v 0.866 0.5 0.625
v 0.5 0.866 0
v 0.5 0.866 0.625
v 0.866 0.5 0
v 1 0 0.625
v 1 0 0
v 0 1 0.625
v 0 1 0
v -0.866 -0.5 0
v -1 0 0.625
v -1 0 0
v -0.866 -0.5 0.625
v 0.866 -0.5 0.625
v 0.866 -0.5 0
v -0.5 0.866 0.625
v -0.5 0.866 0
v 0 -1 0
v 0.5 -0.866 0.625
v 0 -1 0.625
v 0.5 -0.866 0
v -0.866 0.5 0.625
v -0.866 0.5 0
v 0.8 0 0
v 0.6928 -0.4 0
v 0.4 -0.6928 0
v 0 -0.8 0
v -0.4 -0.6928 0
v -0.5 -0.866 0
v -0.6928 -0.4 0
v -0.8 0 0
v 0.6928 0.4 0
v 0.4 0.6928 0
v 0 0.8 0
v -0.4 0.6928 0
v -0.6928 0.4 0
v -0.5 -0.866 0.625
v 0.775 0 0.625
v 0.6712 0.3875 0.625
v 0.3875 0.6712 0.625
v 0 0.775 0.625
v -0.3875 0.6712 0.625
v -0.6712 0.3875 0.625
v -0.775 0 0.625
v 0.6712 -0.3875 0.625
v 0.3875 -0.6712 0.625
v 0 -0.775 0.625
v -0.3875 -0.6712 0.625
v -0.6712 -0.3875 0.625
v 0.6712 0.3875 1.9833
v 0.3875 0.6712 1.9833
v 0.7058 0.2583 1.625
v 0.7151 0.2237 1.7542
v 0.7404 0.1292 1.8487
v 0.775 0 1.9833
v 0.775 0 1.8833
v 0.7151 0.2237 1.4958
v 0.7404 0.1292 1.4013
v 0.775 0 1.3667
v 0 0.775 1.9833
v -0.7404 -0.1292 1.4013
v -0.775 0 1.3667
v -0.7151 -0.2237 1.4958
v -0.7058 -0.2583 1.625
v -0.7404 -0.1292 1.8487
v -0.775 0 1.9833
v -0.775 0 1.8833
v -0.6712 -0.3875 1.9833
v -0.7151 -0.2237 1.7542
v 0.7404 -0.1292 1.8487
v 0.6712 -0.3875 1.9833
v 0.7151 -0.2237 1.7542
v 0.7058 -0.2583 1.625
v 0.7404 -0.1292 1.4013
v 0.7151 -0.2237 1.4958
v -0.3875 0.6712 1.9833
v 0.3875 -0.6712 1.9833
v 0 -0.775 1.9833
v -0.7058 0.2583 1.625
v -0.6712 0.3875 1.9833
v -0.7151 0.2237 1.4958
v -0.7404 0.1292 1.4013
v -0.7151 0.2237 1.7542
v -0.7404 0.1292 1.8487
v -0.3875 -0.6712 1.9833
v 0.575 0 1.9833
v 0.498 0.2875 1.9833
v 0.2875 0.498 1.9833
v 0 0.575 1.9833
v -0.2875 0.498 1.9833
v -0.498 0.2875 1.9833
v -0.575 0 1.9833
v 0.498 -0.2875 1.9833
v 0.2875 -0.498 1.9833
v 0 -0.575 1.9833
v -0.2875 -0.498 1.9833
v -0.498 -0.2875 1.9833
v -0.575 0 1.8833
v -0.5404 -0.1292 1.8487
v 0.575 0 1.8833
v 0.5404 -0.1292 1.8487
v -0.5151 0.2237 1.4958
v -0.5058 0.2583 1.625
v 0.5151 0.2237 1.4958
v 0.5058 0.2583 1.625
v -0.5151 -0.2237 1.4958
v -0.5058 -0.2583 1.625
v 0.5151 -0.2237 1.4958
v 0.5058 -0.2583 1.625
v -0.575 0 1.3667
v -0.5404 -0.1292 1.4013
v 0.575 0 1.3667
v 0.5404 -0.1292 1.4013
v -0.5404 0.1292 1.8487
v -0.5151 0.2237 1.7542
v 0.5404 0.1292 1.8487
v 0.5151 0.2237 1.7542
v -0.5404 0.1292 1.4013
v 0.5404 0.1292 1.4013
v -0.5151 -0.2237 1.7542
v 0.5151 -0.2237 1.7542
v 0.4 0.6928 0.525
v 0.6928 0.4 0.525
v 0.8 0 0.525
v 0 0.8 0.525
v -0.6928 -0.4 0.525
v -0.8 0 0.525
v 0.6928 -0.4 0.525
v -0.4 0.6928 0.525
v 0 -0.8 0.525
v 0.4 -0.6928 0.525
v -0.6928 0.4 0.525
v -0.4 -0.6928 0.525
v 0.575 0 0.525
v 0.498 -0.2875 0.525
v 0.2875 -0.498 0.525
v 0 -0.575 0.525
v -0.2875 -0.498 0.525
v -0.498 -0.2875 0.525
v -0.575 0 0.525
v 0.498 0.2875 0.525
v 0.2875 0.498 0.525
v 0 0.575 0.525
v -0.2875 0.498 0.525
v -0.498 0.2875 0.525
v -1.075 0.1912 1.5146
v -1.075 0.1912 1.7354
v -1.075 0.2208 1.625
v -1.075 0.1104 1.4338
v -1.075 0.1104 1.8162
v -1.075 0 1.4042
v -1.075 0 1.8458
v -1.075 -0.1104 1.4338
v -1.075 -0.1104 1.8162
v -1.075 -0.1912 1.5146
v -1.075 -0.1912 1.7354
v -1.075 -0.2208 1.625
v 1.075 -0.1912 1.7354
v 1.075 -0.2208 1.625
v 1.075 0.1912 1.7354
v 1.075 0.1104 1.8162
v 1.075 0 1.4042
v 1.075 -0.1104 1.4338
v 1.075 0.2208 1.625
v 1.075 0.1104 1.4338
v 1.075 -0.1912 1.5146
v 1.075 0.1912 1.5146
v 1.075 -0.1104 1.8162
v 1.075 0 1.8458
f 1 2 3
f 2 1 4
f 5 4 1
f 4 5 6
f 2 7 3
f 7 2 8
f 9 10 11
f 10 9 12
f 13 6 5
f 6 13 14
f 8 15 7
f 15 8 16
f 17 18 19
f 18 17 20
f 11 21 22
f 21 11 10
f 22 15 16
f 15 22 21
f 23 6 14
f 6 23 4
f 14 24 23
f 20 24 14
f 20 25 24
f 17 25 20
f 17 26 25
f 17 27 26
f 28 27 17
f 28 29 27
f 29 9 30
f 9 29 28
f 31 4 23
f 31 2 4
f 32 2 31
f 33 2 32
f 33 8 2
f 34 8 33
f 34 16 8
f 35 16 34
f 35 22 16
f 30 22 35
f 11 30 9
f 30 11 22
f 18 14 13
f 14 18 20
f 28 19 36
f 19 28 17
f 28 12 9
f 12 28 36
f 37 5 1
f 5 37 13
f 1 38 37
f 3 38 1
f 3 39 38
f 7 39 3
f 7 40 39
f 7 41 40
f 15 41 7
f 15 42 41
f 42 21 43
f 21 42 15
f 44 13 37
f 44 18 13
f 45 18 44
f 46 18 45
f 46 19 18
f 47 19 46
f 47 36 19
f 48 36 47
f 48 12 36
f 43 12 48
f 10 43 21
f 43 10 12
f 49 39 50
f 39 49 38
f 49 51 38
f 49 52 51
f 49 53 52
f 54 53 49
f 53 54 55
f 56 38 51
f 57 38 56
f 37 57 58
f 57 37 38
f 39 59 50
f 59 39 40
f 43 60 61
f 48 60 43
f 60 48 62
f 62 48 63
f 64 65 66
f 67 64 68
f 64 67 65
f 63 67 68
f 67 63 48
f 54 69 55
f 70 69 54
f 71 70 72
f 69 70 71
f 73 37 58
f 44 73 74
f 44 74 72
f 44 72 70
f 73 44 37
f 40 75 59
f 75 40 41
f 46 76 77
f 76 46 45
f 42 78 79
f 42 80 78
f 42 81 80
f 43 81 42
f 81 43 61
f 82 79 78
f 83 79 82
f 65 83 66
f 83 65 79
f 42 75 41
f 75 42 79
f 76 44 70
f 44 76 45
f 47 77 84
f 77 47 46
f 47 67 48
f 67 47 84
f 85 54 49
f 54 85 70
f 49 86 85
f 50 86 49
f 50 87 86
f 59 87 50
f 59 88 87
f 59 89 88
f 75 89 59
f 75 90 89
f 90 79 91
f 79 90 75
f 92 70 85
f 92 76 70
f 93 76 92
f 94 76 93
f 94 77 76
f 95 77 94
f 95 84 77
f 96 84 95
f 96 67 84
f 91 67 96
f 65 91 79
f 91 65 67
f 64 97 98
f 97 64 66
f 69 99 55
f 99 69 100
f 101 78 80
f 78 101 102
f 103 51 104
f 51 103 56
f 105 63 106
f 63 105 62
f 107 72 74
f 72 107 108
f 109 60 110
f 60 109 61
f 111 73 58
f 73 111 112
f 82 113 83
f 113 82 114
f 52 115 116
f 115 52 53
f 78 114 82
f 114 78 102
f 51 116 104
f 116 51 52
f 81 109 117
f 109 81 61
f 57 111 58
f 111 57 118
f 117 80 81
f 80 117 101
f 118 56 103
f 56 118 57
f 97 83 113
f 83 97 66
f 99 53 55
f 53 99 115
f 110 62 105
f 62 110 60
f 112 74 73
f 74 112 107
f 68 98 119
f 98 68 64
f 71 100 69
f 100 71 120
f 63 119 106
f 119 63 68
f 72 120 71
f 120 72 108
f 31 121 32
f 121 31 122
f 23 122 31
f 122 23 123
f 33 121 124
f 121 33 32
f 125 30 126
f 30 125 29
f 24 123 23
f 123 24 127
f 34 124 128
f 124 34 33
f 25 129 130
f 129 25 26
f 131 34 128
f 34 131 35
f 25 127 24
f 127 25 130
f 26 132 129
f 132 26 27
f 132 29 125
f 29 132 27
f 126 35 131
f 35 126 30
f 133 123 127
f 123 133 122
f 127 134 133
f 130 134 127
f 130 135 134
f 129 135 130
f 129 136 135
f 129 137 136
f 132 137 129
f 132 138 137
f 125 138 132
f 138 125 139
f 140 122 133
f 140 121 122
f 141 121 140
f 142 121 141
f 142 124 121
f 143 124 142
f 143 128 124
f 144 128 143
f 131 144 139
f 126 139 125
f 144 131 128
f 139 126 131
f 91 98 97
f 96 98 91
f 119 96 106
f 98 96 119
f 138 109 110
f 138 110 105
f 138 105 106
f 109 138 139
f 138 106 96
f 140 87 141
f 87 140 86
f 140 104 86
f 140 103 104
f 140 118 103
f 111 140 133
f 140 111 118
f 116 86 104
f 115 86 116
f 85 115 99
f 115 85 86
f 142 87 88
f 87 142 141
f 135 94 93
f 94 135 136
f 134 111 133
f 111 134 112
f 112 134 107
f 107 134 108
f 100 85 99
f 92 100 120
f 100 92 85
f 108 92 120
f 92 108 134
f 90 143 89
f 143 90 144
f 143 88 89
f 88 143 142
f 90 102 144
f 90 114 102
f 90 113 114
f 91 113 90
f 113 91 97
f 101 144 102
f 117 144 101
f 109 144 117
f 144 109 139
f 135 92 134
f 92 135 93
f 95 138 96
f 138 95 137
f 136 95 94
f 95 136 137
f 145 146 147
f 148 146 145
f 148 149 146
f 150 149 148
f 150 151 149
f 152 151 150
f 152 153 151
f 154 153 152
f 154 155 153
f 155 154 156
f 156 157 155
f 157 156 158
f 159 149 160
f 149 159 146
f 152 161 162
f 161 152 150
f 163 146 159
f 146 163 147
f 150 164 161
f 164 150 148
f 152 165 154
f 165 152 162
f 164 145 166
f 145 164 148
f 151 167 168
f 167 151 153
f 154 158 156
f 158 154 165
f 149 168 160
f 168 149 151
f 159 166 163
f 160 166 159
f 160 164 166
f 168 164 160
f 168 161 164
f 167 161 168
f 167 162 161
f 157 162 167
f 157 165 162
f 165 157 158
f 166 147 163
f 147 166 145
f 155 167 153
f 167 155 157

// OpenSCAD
tolerance=0.075;
hole_radius=0.05;
grid_hole_radius=0.05;
outer_radius=1;
thickness=0.2;
hole_attach_height=0.05;
attach_thickness=0.1;
bottom_rotation_height=1.625;
top_rotation_height=1.35;
next_hole_radius=0.05;
next_hole_attach_height=0.05;
next_inner=0.8;
max_turn=90.0;
min_turn=90.0;
hole_twist=0.0;

//parameters that don't have to be defined explicitly
eps = tolerance/100;
inner_radius = outer_radius - thickness;
axle_offset = attach_thickness;
bottom_joint_attach_radius = outer_radius - hole_attach_height - grid_hole_radius*2 - tolerance;
fn = 12;
fnh = 6;

//solve for b = axle height
max_turn_b = outer_radius / tan((180 - max_turn)/2);
min_turn_b = outer_radius / tan((180 - min_turn)/2);
axle_radius = bottom_joint_attach_radius/3;

grid_hole_height = hole_radius*2 + hole_attach_height * 2;
bottom_joint_grid_clearance = bottom_rotation_height - (hole_attach_height*2 + hole_radius*2 + grid_hole_height + max_turn_b + attach_thickness);

module angled_cylinder(angle_deg_y, _h, _r, angle_deg_x = 0) {
    rotate([angle_deg_x, angle_deg_y, 0]) { // Rotate the cylinder 
            cylinder(h = _h, r = _r, center = true, $fn = fnh);
        }
}

module hole(_h) {
    cylinder(h = _h, r = grid_hole_radius, $fn = fnh);
}

//makes circle of holes
module circular_grid(_h, _r, _n) {
    for (i = [0:_n-1]) {
        angle = i * 360 / _n;
        x_pos = _r * cos(angle);
        y_pos = _r * sin(angle);
        translate([x_pos, y_pos, -eps]) {
            hole(_h);
        }
    }
}

//makes grid of holes
module hole_grid(hole_height, grid_h) {
    translate([0,0,hole_height]) {
        difference() {
            //cylinder
            cylinder(h = grid_h, r = (inner_radius + outer_radius)/2, 
                center=false, $fn = fn);
            //holes
            for (i = [0 : grid_hole_radius * 2 + hole_attach_height : inner_radius - grid_hole_radius * 2]) {
                circular_grid(grid_h + eps*2, i, ceil(6.28*i/(grid_hole_radius*4)));
            }
            
        } 
    }
}

module joint_bottom() {
    //make grid of holes
    grid_hole_height = hole_radius*2 + hole_attach_height * 2;
    //hole_grid(grid_hole_height, grid_hole_radius);
    
    bottom_joint_attach_height = max_turn_b + axle_radius + axle_offset;
   
    operating_height = hole_attach_height*2 + attach_thickness + hole_radius*2 + grid_hole_height + bottom_joint_grid_clearance;
    difference() {
        //bottom joint
        union() {
            cylinder(h=operating_height, r=outer_radius, $fn = fn);
            
            translate([0,0,operating_height]) {
                cylinder(h=bottom_joint_attach_height,r=bottom_joint_attach_radius,$fn=fn);
                //enforce min turn
                difference() {
                    cylinder(h=max_turn_b - min_turn_b,r=outer_radius,$fn=fn);
                    translate([-outer_radius,-outer_radius*2,-eps/2])
                    cube([outer_radius*2 + eps,outer_radius*2 + axle_radius + axle_offset + tolerance + eps,max_turn_b - min_turn_b + eps]);
                    
                    translate([-outer_radius,0,max_turn_b])
                    rotate([-(90+min_turn),0,0])
                    translate([0,-max_turn_b + eps/2,-axle_radius-axle_offset])
                    cube([outer_radius*2,max_turn_b - min_turn_b + eps,outer_radius*2+ axle_radius + axle_offset], center=false);
                }
                
                
            }
        }
        
        //hole for axle
        translate([0,0,operating_height + max_turn_b])
        rotate([0,90,0])
        cylinder(h=outer_radius*2,r=axle_radius,center=true,$fn=fn);
        
        //shelling
        cylinder(h=operating_height - attach_thickness, r=inner_radius, center = false, $fn = fn);
        
        cylinder(h=operating_height + bottom_joint_attach_height + eps, r =          bottom_joint_attach_radius - thickness, center = false, $fn = fn);
        //shell tolerance
        cylinder(h=eps, r=inner_radius, center=true,$fn = fn);
        
        //screw holes
//        translate([0,0,hole_radius + hole_attach_height]) 
//        rotate([0,0,hole_twist]) {
//            angled_cylinder(0, (outer_radius*1.5 + eps) * 2,  hole_radius, 90);
//            angled_cylinder(90, (outer_radius*1.5 + eps) * 2, hole_radius, 0);
//        } 
        
        //holes for routing strings
//        translate([0,-inner_radius + thickness,-hole_attach_height - grid_hole_radius + operating_height])
//        rotate([90,0,0])
//        cylinder(h=thickness + inner_radius + eps, r=grid_hole_radius,$fn=fn);
//        
//        translate([0,outer_radius,-hole_attach_height - grid_hole_radius + operating_height + max_turn_b - min_turn_b])
//        rotate([90,0,0])
//        cylinder(h=thickness + inner_radius + eps, r=grid_hole_radius,$fn=fn);
//        
//        translate([0,bottom_joint_attach_radius + hole_attach_height + grid_hole_radius,operating_height - attach_thickness - eps/2])
//        cylinder(h=attach_thickness + max_turn_b - min_turn_b - hole_attach_height + eps, r=grid_hole_radius,$fn=fn);
    }
}

module axle() {
    cylinder(h=outer_radius*2 + tolerance*2, r = axle_radius - tolerance/2, $fn = fn);
}

joint_bottom();

rotate([0,90,0])
translate([-bottom_rotation_height,0,-outer_radius - tolerance])
axle();
